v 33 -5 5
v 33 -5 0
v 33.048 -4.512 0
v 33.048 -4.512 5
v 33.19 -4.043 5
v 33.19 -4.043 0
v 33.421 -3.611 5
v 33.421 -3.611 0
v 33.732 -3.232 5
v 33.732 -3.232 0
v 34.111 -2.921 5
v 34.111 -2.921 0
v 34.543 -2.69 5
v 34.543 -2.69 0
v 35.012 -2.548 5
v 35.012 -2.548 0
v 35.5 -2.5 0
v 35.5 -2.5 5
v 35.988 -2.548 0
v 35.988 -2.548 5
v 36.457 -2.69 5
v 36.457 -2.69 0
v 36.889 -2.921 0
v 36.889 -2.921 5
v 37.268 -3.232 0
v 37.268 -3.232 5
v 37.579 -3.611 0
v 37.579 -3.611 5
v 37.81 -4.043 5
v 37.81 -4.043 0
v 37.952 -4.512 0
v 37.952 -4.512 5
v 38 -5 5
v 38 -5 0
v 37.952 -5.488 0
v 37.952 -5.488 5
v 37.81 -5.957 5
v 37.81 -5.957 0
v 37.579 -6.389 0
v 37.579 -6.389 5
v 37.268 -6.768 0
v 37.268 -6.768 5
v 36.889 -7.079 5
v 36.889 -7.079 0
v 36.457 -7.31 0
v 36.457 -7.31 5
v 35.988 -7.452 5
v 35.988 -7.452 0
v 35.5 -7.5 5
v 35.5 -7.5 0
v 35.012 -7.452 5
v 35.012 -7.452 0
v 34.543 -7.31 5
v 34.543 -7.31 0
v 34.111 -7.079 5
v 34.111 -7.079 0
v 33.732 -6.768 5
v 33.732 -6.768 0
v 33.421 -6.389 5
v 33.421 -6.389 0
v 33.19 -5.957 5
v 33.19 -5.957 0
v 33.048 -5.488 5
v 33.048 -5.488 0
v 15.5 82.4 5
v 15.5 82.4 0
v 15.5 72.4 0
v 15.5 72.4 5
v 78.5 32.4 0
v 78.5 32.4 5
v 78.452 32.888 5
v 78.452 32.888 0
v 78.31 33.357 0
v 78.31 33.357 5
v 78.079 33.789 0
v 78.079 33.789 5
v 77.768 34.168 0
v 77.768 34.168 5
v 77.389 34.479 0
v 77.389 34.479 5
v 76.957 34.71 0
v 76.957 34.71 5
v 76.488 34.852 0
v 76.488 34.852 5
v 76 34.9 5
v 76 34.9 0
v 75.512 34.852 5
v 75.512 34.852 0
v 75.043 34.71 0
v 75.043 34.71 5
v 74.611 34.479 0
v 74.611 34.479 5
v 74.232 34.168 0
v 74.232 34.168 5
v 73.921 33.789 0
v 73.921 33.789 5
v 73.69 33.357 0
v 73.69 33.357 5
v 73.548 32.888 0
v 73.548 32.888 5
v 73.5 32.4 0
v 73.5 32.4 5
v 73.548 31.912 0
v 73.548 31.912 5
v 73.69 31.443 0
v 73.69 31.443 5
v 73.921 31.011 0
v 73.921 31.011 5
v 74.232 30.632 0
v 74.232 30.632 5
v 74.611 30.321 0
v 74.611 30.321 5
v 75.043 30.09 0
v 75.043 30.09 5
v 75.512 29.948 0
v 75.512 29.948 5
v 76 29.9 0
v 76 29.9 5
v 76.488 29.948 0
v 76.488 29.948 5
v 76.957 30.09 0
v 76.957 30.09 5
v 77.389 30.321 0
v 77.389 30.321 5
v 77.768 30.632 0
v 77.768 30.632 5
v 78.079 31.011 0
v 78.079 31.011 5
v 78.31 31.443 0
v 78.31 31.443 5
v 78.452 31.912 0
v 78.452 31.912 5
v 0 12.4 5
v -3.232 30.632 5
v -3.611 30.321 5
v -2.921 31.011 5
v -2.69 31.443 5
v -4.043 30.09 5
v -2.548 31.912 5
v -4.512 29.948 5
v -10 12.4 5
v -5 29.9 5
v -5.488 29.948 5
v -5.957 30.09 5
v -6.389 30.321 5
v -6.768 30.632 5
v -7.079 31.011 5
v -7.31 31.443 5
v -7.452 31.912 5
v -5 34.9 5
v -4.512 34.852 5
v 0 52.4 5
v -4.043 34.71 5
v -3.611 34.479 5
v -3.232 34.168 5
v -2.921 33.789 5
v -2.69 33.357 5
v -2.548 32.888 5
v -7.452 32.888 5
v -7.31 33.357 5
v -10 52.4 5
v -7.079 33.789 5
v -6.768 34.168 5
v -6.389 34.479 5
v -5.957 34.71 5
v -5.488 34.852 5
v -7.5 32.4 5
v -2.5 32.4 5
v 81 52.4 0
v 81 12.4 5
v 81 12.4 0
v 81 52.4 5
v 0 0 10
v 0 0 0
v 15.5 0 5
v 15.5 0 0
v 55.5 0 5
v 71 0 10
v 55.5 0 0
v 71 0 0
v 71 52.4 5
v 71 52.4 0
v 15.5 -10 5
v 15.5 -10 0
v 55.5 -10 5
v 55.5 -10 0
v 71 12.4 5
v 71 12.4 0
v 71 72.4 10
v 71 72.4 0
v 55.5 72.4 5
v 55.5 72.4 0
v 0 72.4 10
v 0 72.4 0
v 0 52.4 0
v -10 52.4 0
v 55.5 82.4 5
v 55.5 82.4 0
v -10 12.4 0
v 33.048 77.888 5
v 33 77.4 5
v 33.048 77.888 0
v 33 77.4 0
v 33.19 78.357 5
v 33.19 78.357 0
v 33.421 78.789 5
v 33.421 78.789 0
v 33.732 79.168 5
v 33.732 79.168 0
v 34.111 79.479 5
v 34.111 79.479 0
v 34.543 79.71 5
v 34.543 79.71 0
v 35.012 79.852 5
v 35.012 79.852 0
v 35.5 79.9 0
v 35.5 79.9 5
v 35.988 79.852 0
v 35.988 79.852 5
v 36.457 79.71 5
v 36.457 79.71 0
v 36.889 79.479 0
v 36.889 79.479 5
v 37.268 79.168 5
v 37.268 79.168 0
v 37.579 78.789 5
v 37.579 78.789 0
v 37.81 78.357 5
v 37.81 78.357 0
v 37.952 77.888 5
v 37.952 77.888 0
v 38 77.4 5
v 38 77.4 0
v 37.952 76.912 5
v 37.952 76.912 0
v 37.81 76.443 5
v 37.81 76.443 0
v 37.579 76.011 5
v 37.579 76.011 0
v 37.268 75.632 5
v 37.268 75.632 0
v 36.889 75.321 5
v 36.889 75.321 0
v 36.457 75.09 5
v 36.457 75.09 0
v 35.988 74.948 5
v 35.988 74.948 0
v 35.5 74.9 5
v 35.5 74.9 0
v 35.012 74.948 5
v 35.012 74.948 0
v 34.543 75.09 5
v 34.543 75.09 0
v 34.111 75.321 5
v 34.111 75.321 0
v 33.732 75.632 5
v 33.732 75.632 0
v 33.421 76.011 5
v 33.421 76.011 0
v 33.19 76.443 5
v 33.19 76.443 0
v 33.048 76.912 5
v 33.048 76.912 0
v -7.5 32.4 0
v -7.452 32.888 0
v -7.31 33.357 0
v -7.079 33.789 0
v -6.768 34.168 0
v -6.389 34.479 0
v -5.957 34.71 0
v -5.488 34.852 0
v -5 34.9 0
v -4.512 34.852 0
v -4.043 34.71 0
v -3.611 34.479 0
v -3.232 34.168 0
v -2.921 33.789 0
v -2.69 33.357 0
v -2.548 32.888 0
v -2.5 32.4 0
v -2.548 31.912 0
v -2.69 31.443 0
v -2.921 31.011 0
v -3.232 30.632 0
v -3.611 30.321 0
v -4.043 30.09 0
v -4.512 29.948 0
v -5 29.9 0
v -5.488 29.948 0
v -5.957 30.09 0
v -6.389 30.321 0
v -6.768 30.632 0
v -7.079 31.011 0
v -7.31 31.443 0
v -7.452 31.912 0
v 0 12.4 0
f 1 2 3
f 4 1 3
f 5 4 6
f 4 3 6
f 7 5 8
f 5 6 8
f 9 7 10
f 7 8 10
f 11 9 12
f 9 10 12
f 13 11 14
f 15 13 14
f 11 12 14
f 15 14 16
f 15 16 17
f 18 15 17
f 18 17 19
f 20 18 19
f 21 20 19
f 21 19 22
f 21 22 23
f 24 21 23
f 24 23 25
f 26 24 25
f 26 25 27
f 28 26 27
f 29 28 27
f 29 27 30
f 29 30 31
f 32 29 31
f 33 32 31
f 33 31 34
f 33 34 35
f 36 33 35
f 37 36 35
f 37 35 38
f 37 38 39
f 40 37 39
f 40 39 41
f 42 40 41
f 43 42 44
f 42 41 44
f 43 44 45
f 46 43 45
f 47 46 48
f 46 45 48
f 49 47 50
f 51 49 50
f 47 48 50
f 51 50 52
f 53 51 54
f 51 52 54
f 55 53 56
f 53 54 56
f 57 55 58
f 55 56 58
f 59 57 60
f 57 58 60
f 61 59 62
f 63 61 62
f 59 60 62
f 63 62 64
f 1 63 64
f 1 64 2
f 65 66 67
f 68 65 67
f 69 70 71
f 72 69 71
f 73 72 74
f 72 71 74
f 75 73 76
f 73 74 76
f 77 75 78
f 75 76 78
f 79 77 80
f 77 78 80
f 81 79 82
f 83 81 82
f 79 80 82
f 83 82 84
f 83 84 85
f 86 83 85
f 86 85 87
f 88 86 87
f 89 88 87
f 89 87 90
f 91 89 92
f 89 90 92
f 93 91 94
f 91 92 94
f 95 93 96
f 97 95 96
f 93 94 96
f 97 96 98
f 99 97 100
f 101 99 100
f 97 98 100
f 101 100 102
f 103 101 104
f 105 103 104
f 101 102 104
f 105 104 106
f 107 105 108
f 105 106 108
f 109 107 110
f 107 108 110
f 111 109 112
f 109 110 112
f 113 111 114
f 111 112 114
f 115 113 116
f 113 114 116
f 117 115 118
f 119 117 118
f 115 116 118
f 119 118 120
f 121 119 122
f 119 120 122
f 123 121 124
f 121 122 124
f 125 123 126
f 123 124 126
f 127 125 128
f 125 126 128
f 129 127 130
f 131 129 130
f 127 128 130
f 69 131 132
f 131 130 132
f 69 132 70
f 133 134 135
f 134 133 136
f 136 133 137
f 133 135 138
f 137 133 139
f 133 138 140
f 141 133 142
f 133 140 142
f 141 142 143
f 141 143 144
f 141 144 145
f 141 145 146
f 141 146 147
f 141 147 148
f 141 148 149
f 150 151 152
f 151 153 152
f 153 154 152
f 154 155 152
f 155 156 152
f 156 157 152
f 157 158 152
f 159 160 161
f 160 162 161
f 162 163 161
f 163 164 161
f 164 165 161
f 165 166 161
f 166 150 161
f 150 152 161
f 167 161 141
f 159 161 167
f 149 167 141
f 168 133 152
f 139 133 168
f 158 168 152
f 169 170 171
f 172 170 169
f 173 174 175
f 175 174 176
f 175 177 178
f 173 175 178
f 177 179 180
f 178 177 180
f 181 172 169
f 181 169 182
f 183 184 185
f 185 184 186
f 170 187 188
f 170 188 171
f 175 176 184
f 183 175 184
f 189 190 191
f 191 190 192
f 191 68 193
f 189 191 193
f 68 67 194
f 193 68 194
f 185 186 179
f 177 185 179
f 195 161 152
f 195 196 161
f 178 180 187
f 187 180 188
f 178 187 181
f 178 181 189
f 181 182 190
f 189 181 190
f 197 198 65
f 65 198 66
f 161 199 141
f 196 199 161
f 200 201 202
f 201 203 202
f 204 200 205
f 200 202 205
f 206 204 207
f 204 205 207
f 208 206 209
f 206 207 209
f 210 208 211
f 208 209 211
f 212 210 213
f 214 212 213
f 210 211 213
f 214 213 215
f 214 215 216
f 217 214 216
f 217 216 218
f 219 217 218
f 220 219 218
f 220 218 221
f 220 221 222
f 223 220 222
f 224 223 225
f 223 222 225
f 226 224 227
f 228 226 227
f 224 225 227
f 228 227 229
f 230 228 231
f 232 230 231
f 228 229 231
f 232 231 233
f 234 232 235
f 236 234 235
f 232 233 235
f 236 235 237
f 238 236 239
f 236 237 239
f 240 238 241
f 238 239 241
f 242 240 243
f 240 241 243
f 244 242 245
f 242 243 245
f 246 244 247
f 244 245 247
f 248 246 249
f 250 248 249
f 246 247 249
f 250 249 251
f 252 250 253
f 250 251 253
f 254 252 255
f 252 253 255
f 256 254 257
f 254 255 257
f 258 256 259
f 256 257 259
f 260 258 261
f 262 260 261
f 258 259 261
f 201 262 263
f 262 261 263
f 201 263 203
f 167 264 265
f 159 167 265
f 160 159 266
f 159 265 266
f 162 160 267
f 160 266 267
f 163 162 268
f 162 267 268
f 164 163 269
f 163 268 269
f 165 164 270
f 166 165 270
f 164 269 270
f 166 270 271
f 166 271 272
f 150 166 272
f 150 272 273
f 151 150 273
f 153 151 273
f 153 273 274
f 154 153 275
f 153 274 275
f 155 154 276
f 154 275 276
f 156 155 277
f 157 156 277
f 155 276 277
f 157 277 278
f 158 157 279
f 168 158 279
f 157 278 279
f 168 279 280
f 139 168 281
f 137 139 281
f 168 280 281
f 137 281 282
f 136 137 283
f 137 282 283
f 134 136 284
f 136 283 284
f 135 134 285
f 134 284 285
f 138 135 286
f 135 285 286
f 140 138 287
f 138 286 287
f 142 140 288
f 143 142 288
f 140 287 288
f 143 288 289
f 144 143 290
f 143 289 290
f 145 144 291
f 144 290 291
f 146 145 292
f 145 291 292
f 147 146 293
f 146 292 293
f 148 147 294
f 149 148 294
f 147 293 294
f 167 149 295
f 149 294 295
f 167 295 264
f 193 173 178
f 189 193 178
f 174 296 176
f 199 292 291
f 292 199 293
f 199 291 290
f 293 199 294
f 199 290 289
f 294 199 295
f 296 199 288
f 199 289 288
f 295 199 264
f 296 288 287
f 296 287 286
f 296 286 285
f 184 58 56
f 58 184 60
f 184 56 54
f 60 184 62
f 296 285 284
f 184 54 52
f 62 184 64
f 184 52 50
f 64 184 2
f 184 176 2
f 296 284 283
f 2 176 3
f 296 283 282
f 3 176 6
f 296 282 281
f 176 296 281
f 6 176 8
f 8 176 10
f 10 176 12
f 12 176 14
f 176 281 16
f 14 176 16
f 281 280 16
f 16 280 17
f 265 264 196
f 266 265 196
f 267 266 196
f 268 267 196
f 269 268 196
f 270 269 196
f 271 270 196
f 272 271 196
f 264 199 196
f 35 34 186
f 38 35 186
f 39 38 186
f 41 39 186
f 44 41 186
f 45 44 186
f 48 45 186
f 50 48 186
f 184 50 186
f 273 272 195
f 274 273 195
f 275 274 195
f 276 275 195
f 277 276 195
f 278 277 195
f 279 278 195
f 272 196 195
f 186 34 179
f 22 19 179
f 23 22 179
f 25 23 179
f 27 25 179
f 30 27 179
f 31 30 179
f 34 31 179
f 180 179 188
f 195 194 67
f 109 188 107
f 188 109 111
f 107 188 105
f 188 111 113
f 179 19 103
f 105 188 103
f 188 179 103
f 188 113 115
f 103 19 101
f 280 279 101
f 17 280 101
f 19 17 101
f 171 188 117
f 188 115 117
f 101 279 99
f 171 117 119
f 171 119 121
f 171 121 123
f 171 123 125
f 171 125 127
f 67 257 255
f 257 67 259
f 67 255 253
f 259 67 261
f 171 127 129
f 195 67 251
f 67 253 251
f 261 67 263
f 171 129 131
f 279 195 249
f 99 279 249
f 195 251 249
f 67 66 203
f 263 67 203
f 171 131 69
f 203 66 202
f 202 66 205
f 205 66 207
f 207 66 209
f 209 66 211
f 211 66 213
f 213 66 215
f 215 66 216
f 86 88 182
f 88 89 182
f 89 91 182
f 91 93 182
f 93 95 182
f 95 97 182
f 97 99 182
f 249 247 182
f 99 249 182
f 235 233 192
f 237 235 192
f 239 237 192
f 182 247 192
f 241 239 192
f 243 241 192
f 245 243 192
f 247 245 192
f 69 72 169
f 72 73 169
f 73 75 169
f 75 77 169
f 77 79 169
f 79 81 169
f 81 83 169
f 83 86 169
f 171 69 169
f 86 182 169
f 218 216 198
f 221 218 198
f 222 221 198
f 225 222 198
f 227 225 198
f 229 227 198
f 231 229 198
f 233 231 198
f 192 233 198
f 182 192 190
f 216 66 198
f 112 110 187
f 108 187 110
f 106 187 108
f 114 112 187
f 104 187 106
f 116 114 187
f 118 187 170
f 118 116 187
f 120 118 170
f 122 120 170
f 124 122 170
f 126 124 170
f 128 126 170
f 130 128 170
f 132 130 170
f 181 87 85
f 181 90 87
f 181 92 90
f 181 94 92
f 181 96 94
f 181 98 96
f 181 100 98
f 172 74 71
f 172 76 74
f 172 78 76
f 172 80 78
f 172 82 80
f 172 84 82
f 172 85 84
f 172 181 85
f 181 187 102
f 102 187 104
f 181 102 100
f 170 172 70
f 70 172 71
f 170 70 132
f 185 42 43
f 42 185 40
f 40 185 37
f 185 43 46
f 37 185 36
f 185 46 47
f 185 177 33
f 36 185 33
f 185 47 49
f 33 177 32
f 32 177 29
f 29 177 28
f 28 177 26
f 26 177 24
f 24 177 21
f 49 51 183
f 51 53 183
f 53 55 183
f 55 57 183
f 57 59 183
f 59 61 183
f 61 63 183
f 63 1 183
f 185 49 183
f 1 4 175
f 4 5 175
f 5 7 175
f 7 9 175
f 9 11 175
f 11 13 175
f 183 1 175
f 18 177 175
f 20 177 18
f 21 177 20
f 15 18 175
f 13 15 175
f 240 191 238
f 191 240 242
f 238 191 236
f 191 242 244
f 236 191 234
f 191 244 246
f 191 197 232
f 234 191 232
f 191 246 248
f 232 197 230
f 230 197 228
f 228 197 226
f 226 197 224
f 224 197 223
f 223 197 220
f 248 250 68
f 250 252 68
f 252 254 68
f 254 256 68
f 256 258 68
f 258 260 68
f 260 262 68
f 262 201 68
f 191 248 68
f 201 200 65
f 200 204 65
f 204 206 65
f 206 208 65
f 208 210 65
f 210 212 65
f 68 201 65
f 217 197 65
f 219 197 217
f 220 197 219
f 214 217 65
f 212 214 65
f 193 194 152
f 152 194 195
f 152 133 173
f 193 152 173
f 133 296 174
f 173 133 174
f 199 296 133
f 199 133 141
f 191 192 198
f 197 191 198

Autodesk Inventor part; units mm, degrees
ref_plane "YZ Plane" through (0, 0, 0) normal (1, 0, 0) x (0, 1, 0)
ref_plane "XZ Plane" through (0, 0, 0) normal (0, 1, 0) x (-1, 0, 0)
ref_plane "XY Plane" through (0, 0, 0) normal (0, 0, 1) x (1, 0, 0)
sketch "Sketch1" plane through (0, 0, 0) normal (0, 0, 1) x (1, 0, 0)
  line L0 (0, 0) -> (71, 0)
  line L1 (71, 0) -> (71, 72.4)
  line L2 (71, 72.4) -> (0, 72.4)
  line L3 (0, 72.4) -> (0, 0)
  dimension "d0" = 71
  dimension "d1" = 72.4
extrude "Extrusion1" add sketch "Sketch1" along normal blind 10
sketch "Sketch2" plane through (0, 0, 10) normal (0, 0, 1) x (1, 0, 0)
  line L0 (71, 0) -> (71, 72.4) projected
  line L1 (71, 12.4) -> (81, 12.4)
  line L2 (81, 12.4) -> (81, 52.4)
  line L3 (81, 52.4) -> (71, 52.4)
  line L4 (71, 52.4) -> (71, 12.4)
  line L5 (71, 72.4) -> (0, 72.4) projected
  circle A0 centre (76, 32.4) radius 2.5
  line L6 (0, 0) -> (71, 0) projected
  point P0 (81, 32.4)
  point P1 (76, 52.4)
  dimension "d4" = 10
  dimension "d5" = 40
  dimension "d7" = 5
  dimension "d53" = 20
extrude "Extrusion2" add sketch "Sketch2" against normal blind 10
sketch "Sketch3" plane through (0, 0, 10) normal (0, 0, 1) x (1, 0, 0)
  line L0 (71, 52.4) -> (81, 52.4) projected
  line L1 (71, 12.4) -> (81, 12.4) projected
  line L2 (81, 52.4) -> (71, 52.4)
  line L3 (71, 52.4) -> (71, 12.4)
  line L4 (71, 12.4) -> (81, 12.4)
  line L5 (81, 12.4) -> (81, 52.4)
  point P0 (0, 0)
extrude "Extrusion3" cut sketch "Sketch3" against normal blind 5
sketch "Sketch10" plane through (0, 0, 0) normal (0, 0, -1) x (-1, 0, 0)
  line L0 (0, 72.4) -> (0, 0) projected
  line L1 (0, 12.4) -> (10, 12.4)
  line L2 (10, 12.4) -> (10, 52.4)
  line L3 (10, 52.4) -> (0, 52.4)
  line L4 (0, 52.4) -> (0, 12.4)
  circle A0 centre (5, 32.4) radius 2.5
  point P0 (-81, 12.4)
  point P1 (10, 32.4)
  point P2 (5, 12.4)
  dimension "d40" = 10
  dimension "d41" = 40
  dimension "d42" = 5
extrude "Extrusion10" add sketch "Sketch10" against normal blind 5
sketch "Sketch11" plane through (0, 0, 0) normal (0, 0, -1) x (-1, 0, 0)
  line L0 (-71, 72.4) -> (0, 72.4) projected
  line L1 (-15.5, 72.4) -> (-55.5, 72.4)
  line L2 (-55.5, 72.4) -> (-55.5, 82.4)
  line L3 (-55.5, 82.4) -> (-15.5, 82.4)
  line L4 (-15.5, 82.4) -> (-15.5, 72.4)
  circle A0 centre (-35.5, 77.4) radius 2.5
  point P0 (0, 0)
  point P1 (-35.5, 82.4)
  point P2 (-35.5, 72.4)
  point P3 (-15.5, 77.4)
  dimension "d46" = 40
  dimension "d47" = 10
  dimension "d48" = 5
extrude "Extrusion11" add sketch "Sketch11" against normal blind 5
sketch "Sketch12" plane through (0, 0, 0) normal (0, 0, -1) x (-1, 0, 0)
  line L0 (0, 0) -> (-71, 0) projected
  line L1 (-55.5, 0) -> (-15.5, 0)
  line L2 (-15.5, 0) -> (-15.5, -10)
  line L3 (-15.5, -10) -> (-55.5, -10)
  line L4 (-55.5, -10) -> (-55.5, 0)
  circle A0 centre (-35.5, -5) radius 2.5
  point P0 (-55.5, 82.4)
  point P1 (-15.5, 82.4)
  point P2 (-35.5, -10)
  point P3 (-55.5, -5)
  dimension "d54" = 10
  dimension "d55" = 5
extrude "Extrusion12" add sketch "Sketch12" against normal blind 5
properties part number "SP002" material "ABS Plastic"
